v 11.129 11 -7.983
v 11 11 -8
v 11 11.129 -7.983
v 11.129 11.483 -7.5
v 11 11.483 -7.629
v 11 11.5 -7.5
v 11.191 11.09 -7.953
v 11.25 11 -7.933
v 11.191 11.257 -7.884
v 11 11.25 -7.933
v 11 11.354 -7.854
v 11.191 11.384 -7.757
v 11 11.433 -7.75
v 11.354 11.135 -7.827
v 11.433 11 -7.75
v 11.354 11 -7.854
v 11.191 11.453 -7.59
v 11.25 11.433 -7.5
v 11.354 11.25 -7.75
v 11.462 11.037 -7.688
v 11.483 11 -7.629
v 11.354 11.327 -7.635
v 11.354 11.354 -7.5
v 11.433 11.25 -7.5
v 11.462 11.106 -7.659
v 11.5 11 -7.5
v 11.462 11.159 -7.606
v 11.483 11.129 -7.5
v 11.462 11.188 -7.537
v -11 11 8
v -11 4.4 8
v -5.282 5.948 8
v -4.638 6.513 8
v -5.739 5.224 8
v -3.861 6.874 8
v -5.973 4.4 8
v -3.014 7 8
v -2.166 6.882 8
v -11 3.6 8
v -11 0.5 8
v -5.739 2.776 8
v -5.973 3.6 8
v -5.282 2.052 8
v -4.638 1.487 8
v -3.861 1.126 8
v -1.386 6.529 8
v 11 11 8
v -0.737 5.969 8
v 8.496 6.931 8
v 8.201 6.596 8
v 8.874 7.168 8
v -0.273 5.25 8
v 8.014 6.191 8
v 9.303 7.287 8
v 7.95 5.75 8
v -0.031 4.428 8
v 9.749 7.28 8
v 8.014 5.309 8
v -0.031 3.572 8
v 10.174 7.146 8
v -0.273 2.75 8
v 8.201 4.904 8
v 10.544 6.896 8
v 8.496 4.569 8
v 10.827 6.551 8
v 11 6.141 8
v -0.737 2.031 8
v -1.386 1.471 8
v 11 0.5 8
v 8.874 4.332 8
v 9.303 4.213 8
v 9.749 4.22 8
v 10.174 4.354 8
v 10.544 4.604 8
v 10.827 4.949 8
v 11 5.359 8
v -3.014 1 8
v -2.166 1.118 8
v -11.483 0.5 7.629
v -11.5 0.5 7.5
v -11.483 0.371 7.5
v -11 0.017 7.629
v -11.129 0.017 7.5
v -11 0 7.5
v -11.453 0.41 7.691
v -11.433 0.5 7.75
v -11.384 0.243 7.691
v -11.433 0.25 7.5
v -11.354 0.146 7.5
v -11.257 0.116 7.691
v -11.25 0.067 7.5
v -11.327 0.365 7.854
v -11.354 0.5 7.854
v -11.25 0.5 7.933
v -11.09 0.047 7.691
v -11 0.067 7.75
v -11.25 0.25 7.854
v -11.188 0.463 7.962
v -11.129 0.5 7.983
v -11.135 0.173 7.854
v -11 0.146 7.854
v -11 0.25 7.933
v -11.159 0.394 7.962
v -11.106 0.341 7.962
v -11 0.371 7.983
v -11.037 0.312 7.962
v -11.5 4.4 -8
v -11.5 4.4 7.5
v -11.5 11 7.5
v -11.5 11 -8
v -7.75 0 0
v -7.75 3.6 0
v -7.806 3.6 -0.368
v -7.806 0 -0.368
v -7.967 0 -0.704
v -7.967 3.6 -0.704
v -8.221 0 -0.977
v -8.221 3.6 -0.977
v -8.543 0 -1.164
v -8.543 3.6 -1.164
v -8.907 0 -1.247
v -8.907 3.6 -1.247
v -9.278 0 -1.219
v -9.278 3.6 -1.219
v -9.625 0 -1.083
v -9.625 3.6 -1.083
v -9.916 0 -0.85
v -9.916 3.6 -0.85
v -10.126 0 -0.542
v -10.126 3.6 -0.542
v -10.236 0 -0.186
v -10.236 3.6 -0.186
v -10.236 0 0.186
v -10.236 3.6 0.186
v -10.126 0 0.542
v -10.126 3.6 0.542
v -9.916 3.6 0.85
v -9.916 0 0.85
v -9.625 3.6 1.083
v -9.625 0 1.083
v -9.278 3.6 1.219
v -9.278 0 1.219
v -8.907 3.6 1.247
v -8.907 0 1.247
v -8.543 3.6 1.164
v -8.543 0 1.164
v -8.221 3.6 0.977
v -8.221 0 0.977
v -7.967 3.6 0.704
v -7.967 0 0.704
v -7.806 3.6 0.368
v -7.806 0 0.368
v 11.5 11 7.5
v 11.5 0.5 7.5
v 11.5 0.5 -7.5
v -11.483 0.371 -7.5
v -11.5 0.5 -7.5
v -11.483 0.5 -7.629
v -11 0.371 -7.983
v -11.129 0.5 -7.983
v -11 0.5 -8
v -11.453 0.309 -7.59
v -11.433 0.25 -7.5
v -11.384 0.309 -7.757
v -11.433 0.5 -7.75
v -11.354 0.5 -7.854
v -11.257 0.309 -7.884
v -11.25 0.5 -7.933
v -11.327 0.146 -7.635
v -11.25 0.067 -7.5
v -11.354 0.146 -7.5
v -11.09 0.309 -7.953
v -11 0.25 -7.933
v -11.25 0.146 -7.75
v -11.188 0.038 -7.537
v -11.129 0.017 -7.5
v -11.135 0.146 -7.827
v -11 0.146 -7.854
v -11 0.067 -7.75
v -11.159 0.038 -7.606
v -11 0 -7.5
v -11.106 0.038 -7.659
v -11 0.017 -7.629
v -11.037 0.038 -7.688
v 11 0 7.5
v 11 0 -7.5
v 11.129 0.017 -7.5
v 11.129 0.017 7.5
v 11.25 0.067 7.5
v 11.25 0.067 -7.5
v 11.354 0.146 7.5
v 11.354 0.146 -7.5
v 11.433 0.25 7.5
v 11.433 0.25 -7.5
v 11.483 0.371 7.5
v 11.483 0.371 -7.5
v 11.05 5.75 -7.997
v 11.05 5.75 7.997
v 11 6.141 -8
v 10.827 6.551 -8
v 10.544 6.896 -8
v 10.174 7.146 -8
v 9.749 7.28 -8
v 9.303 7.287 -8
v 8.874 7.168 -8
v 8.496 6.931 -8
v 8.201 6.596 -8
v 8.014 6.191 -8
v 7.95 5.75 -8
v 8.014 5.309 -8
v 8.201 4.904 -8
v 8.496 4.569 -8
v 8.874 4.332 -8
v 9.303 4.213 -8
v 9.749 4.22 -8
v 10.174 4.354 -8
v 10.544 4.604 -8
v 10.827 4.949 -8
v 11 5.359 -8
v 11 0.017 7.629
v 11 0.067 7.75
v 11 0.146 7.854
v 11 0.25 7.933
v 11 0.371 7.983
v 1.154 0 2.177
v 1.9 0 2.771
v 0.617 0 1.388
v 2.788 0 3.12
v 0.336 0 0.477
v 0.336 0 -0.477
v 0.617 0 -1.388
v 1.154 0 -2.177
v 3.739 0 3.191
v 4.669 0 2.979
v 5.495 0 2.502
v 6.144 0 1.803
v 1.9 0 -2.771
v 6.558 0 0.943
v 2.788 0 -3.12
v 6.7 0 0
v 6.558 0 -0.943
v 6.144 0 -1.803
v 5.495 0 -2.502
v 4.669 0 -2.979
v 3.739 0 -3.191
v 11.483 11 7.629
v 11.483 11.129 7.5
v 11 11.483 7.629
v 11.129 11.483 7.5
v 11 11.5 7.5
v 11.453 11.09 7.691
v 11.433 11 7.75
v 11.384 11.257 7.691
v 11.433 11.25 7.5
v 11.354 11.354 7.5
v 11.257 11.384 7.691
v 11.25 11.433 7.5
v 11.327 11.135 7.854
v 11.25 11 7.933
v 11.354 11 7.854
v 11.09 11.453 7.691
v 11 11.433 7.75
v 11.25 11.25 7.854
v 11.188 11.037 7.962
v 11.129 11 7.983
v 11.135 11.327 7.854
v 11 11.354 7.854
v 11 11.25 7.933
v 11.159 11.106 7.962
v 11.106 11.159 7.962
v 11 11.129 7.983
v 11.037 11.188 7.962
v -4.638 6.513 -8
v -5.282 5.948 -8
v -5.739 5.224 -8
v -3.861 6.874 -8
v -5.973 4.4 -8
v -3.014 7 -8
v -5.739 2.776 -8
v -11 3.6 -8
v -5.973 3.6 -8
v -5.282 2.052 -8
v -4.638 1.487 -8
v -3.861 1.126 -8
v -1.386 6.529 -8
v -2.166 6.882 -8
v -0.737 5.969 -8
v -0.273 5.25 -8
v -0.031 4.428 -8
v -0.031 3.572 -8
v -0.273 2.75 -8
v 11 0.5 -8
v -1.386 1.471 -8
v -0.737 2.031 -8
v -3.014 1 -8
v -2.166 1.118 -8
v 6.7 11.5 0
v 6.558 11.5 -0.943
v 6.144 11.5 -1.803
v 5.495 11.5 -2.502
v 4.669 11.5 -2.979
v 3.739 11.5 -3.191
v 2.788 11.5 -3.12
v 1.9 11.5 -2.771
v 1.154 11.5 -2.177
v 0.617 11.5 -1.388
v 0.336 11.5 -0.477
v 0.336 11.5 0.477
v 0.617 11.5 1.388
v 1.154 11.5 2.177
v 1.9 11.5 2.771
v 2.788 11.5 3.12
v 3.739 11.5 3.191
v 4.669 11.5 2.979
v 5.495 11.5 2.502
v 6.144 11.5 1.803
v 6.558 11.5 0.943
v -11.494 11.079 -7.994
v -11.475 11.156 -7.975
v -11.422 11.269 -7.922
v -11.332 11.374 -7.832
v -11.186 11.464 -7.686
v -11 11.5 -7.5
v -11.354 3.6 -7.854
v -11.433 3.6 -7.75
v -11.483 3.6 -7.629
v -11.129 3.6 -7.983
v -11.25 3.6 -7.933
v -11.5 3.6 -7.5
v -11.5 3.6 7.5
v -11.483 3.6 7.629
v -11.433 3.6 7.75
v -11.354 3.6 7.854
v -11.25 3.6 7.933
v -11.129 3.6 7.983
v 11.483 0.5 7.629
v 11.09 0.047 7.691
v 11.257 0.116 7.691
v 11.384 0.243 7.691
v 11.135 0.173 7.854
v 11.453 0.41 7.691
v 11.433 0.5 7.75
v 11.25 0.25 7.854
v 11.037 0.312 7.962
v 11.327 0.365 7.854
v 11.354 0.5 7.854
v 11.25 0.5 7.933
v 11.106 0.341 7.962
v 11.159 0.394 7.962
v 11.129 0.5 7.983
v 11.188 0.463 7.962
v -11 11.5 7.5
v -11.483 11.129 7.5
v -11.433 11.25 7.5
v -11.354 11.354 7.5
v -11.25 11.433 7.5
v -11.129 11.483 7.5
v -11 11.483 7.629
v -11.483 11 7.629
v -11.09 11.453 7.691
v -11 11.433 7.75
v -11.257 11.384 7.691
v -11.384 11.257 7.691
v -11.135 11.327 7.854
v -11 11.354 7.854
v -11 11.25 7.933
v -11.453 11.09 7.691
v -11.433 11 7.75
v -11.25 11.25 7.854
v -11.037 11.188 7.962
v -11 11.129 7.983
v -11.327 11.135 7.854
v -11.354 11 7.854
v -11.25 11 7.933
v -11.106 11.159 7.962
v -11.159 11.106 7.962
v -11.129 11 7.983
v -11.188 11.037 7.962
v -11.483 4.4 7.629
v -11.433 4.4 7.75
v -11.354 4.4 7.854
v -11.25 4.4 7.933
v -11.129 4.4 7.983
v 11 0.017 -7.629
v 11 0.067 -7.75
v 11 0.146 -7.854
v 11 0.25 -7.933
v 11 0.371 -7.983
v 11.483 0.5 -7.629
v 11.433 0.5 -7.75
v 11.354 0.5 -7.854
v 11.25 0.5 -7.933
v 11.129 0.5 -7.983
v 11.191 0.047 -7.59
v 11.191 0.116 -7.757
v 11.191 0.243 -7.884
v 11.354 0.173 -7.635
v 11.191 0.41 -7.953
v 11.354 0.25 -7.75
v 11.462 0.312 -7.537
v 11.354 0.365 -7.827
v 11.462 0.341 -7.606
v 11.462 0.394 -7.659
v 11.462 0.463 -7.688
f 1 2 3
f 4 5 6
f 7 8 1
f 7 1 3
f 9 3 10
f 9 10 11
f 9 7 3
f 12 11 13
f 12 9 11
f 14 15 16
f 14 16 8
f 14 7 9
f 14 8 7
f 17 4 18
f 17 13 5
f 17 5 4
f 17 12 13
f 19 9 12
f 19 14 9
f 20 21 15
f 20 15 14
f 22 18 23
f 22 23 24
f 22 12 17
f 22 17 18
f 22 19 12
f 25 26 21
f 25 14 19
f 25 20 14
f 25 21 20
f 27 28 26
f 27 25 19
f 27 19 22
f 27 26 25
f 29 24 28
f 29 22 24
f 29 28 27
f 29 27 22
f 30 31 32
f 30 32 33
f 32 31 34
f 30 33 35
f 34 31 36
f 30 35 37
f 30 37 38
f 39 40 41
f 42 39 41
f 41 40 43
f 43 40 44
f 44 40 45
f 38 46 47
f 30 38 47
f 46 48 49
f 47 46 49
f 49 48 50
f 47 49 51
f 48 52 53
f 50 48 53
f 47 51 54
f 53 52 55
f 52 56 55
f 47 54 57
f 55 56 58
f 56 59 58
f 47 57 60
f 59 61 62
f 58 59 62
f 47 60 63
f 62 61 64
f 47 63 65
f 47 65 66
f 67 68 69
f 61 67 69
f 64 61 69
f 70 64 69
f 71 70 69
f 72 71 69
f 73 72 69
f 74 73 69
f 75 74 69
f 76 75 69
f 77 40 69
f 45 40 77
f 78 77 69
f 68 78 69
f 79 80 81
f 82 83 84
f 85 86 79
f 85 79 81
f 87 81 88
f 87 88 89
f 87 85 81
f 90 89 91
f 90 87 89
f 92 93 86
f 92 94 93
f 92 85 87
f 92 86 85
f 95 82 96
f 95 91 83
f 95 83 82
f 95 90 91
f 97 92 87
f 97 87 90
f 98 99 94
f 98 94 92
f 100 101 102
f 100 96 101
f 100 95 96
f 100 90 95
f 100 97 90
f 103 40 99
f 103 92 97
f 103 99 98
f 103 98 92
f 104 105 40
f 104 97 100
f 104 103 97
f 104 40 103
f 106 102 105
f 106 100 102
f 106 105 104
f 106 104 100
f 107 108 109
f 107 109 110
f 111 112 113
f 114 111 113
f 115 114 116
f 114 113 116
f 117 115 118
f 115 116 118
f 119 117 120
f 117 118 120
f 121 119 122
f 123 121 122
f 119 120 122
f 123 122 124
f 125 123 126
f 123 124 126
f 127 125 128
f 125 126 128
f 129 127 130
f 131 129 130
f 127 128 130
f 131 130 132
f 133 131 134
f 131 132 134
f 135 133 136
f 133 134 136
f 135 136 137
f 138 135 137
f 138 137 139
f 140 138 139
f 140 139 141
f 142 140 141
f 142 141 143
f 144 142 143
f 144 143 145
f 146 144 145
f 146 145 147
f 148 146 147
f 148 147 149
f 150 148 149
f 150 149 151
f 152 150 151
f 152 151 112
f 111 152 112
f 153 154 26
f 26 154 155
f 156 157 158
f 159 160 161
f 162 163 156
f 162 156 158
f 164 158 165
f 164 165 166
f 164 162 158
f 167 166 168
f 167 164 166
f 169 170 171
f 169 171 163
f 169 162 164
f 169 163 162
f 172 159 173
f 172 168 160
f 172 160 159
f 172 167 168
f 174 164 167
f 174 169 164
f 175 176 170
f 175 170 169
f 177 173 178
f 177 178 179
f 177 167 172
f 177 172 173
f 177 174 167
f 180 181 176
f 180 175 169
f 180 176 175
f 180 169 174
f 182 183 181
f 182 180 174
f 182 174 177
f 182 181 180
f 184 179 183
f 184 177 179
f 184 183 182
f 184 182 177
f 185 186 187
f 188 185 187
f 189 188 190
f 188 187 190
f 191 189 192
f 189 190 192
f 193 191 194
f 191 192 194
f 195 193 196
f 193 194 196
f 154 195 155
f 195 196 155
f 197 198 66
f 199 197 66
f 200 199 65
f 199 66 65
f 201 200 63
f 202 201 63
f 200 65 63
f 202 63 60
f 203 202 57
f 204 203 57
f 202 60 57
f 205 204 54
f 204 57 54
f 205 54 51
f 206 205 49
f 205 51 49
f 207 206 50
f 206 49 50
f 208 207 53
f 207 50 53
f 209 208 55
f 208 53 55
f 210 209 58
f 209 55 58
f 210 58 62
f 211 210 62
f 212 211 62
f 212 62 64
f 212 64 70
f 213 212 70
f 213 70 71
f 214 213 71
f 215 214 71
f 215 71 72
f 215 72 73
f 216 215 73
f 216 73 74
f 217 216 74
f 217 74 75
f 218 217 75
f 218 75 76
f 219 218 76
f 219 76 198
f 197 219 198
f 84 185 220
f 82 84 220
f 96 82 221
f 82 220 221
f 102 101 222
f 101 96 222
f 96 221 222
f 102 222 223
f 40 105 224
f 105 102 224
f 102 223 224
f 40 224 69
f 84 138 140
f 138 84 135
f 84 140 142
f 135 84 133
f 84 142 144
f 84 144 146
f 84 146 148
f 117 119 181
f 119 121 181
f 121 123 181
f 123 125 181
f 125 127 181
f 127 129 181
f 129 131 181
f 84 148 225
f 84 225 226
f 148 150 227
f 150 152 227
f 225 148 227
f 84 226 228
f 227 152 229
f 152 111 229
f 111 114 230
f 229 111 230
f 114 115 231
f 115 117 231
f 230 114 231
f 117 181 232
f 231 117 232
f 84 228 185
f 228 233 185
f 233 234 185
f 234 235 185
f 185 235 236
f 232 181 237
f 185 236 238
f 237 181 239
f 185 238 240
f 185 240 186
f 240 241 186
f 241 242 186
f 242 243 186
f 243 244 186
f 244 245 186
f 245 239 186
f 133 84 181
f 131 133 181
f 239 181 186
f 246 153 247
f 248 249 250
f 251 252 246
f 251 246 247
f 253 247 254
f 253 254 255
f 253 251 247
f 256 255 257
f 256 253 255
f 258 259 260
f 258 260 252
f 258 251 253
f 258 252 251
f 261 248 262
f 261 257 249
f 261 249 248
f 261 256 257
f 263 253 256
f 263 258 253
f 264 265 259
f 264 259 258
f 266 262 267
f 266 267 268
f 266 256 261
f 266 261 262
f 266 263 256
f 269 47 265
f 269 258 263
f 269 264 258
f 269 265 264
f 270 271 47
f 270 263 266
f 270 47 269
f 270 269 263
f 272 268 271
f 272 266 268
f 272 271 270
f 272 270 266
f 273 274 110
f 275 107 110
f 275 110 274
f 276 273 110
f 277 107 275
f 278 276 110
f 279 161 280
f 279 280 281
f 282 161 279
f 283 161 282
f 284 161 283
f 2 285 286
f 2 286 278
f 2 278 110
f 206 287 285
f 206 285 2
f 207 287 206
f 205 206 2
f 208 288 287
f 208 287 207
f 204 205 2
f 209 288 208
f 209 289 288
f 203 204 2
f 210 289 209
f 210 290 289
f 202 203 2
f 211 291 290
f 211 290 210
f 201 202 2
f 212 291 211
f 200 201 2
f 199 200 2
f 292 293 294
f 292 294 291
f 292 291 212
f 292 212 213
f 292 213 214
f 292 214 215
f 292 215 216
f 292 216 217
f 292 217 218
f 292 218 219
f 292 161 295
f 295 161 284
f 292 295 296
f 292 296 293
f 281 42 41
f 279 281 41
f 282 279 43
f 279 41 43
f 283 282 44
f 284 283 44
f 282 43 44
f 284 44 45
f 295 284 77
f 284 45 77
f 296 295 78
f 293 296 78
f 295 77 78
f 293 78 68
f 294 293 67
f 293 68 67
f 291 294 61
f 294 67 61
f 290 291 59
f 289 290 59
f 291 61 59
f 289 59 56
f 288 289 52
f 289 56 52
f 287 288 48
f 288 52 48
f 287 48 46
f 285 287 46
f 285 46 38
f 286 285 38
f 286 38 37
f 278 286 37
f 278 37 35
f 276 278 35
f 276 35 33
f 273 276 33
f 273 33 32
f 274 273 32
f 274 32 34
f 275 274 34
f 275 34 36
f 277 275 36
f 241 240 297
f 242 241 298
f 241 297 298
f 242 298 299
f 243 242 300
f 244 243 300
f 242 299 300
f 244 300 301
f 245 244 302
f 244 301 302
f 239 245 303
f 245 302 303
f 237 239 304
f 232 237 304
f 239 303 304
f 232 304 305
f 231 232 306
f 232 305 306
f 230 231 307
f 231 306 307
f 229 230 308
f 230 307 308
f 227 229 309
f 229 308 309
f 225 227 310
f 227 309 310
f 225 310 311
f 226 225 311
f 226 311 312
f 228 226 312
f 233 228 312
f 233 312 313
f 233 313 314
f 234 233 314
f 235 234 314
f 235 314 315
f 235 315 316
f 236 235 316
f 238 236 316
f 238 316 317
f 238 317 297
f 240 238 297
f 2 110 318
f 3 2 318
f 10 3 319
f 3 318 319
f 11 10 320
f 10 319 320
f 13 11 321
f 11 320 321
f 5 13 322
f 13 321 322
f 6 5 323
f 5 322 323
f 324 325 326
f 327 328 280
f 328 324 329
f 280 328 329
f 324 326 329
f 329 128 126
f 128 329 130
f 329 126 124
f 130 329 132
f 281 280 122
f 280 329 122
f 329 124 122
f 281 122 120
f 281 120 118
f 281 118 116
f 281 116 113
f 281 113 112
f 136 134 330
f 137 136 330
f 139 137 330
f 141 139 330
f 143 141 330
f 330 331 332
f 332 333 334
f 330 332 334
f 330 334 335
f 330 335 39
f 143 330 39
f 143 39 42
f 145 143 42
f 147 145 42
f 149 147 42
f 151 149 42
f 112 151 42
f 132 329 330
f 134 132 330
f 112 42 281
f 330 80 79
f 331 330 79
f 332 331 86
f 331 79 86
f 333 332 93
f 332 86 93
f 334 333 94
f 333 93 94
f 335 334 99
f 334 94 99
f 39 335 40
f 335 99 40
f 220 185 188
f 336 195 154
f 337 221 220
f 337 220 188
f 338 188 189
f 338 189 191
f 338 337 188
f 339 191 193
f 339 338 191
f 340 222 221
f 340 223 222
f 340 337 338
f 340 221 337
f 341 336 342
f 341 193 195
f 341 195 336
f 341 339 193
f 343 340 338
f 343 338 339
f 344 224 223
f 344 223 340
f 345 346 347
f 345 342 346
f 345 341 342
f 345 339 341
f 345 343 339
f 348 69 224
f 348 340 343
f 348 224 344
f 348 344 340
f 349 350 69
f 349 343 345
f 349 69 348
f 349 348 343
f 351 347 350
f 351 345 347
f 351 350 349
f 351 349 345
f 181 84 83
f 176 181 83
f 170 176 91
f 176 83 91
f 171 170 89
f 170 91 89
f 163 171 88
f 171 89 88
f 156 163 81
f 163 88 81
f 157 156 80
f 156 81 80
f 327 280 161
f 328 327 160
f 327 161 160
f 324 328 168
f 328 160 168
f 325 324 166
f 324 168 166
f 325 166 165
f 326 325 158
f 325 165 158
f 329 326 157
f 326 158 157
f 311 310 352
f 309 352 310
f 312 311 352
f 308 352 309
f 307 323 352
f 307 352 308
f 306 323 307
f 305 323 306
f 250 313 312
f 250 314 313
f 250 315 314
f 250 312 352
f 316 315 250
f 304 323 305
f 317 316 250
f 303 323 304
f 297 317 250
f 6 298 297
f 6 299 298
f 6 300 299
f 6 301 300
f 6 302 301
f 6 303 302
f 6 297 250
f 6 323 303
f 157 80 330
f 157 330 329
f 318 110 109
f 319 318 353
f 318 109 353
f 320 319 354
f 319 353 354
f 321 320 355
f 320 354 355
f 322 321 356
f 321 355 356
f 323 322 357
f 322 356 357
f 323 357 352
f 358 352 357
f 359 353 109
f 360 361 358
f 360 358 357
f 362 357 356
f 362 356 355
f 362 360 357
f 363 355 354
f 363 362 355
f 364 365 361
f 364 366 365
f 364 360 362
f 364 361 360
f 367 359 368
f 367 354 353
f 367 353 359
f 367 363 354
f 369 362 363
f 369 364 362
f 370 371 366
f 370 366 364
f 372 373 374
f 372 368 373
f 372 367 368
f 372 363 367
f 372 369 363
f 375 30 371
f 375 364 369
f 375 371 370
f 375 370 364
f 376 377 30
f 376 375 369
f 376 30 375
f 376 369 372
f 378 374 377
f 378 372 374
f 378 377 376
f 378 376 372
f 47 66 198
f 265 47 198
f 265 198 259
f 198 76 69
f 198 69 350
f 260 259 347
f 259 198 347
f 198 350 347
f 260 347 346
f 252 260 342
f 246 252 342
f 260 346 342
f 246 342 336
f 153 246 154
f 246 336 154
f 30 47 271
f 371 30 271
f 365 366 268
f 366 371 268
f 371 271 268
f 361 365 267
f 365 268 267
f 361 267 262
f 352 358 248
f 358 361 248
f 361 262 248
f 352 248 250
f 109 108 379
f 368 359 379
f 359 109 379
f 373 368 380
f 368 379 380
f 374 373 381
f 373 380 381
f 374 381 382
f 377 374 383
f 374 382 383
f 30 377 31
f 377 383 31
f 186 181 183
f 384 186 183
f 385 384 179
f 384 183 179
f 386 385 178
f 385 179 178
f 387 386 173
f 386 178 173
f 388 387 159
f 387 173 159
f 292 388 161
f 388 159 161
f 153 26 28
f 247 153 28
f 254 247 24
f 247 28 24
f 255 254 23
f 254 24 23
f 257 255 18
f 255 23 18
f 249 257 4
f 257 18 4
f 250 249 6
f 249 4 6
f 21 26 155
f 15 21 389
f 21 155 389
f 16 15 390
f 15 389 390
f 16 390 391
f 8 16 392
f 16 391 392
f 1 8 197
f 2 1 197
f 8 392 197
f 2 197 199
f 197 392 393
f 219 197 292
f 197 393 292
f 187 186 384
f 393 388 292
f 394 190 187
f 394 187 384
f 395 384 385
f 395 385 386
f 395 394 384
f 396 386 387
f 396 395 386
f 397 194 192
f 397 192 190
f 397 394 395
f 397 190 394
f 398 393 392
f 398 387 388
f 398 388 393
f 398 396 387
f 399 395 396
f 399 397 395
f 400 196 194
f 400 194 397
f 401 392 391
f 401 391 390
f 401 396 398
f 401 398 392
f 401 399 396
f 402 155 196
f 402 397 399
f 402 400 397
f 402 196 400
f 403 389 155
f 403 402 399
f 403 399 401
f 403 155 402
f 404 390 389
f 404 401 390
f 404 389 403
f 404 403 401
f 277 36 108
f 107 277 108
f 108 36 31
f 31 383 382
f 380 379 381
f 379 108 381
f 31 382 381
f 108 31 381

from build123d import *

# Parameters (mm, degrees)
SKETCH1_W                       = 23
SKETCH1_H                       = 16
BOSS_EXTRUDE1_DEPTH             = 11.5
SKETCH2_R                       = 1.55
CUT_EXTRUDE1_DEPTH              = 23.814469093
FILLET1_R                       = 0.5
M6_CLEARANCE_HOLE1_D            = 6.4
TAP_DRILL_FOR_M3X0_5_TAP1_D     = 2.5
TAP_DRILL_FOR_M3X0_5_TAP1_DEPTH = 4.399


with BuildPart() as part:
    # Sketch1 → Boss-Extrude1 (new body)
    with BuildSketch(Plane(origin=(0, 0, 0), x_dir=(1, 0, 0), z_dir=(0, 1, 0))):
        Rectangle(SKETCH1_W, SKETCH1_H)
    extrude(amount=BOSS_EXTRUDE1_DEPTH)

    # Sketch2 → Cut-Extrude1 (cut, through all)
    with BuildSketch(Plane.XY.offset(8)):
        with Locations((9.5, 5.75)):
            Circle(SKETCH2_R)
        with BuildLine():
            Line((-5.973213749, 4.4), (-11.5, 4.4))
            Line((-11.5, 4.4), (-11.5, 3.6))
            Line((-11.5, 3.6), (-5.973213749, 3.6))
            ThreePointArc((-5.973213749, 3.6), (0, 4), (-5.973213749, 4.4))
        make_face()
    extrude(amount=-CUT_EXTRUDE1_DEPTH, mode=Mode.SUBTRACT)

    # Fillet1
    # the kernel refuses this fillet: 0.5 mm, written as the material it takes off along each edge
    with BuildSketch(Plane(origin=(-11, 0.5, 7.5), x_dir=(0, -1, 0), z_dir=(0, 0, 1))) as fillet1_piece_1_section:
        Polygon((0, 0), (FILLET1_R * 1.02, 0), (FILLET1_R * 1.02, -FILLET1_R * 1.02), (0, -FILLET1_R * 1.02), align=None)
    fillet1_piece_1 = extrude(amount=FILLET1_R * 1.02, mode=Mode.PRIVATE)
    fillet1_piece_1 = fillet1_piece_1 - Plane(origin=(-11, 0.5, 7.5), x_dir=(0.7071067811865475, 0.7071067811865475, 0), z_dir=(0, 0, 1)) * Sphere(FILLET1_R, mode=Mode.PRIVATE)
    add(fillet1_piece_1, mode=Mode.SUBTRACT)
    with BuildSketch(Plane(origin=(-11, 11, 7.5), x_dir=(-1, 0, 0), z_dir=(0, 0, 1))) as fillet1_piece_2_section:
        Polygon((0, 0), (FILLET1_R * 1.02, 0), (FILLET1_R * 1.02, -FILLET1_R * 1.02), (0, -FILLET1_R * 1.02), align=None)
    fillet1_piece_2 = extrude(amount=FILLET1_R * 1.02, mode=Mode.PRIVATE)
    fillet1_piece_2 = fillet1_piece_2 - Plane(origin=(-11, 11, 7.5), x_dir=(0.7071067811865475, -0.7071067811865475, 0), z_dir=(0, 0, 1)) * Sphere(FILLET1_R, mode=Mode.PRIVATE)
    add(fillet1_piece_2, mode=Mode.SUBTRACT)
    with BuildSketch(Plane(origin=(11, 0.5, -7.5), x_dir=(0, -1, 0), z_dir=(1, 0, 0))) as fillet1_piece_3_section:
        Polygon((0, 0), (FILLET1_R * 1.02, 0), (FILLET1_R * 1.02, FILLET1_R * 1.02), (0, FILLET1_R * 1.02), align=None)
    fillet1_piece_3 = extrude(amount=FILLET1_R * 1.02, mode=Mode.PRIVATE)
    fillet1_piece_3 = fillet1_piece_3 - Plane(origin=(11, 0.5, -7.5), x_dir=(0, 0.7071067811865475, 0.7071067811865475), z_dir=(1, 0, 0)) * Sphere(FILLET1_R, mode=Mode.PRIVATE)
    add(fillet1_piece_3, mode=Mode.SUBTRACT)
    with BuildSketch(Plane(origin=(11, 11, -7.5), x_dir=(0, 0, -1), z_dir=(1, 0, 0))) as fillet1_piece_4_section:
        Polygon((0, 0), (FILLET1_R * 1.02, 0), (FILLET1_R * 1.02, FILLET1_R * 1.02), (0, FILLET1_R * 1.02), align=None)
    fillet1_piece_4 = extrude(amount=FILLET1_R * 1.02, mode=Mode.PRIVATE)
    fillet1_piece_4 = fillet1_piece_4 - Plane(origin=(11, 11, -7.5), x_dir=(0, -0.7071067811865475, 0.7071067811865475), z_dir=(1, 0, 0)) * Sphere(FILLET1_R, mode=Mode.PRIVATE)
    add(fillet1_piece_4, mode=Mode.SUBTRACT)
    with BuildSketch(Plane(origin=(-11, 0.5, -7.5), x_dir=(-1, 0, 0), z_dir=(0, -1, 0))) as fillet1_piece_5_section:
        Polygon((0, 0), (FILLET1_R * 1.02, 0), (FILLET1_R * 1.02, FILLET1_R * 1.02), (0, FILLET1_R * 1.02), align=None)
    fillet1_piece_5 = extrude(amount=FILLET1_R * 1.02, mode=Mode.PRIVATE)
    fillet1_piece_5 = fillet1_piece_5 - Plane(origin=(-11, 0.5, -7.5), x_dir=(0.7071067811865477, 0, 0.7071067811865474), z_dir=(0, -1, 0)) * Sphere(FILLET1_R, mode=Mode.PRIVATE)
    add(fillet1_piece_5, mode=Mode.SUBTRACT)
    with BuildSketch(Plane(origin=(11, 0.5, 7.5), x_dir=(1, 0, 0), z_dir=(0, 0, 1))) as fillet1_piece_6_section:
        Polygon((0, 0), (FILLET1_R * 1.02, 0), (FILLET1_R * 1.02, -FILLET1_R * 1.02), (0, -FILLET1_R * 1.02), align=None)
    fillet1_piece_6 = extrude(amount=FILLET1_R * 1.02, mode=Mode.PRIVATE)
    fillet1_piece_6 = fillet1_piece_6 - Plane(origin=(11, 0.5, 7.5), x_dir=(-0.7071067811865475, 0.7071067811865475, 1.4130832128153965e-15), z_dir=(0, 0, 1)) * Sphere(FILLET1_R, mode=Mode.PRIVATE)
    add(fillet1_piece_6, mode=Mode.SUBTRACT)
    with BuildSketch(Plane(origin=(11, 11, 7.5), x_dir=(1, 0, 0), z_dir=(0, 0, 1))) as fillet1_piece_7_section:
        Polygon((0, 0), (FILLET1_R * 1.02, 0), (FILLET1_R * 1.02, FILLET1_R * 1.02), (0, FILLET1_R * 1.02), align=None)
    fillet1_piece_7 = extrude(amount=FILLET1_R * 1.02, mode=Mode.PRIVATE)
    fillet1_piece_7 = fillet1_piece_7 - Plane(origin=(11, 11, 7.5), x_dir=(-0.7071067811865475, -0.7071067811865475, 1.4130832128153965e-15), z_dir=(0, 0, 1)) * Sphere(FILLET1_R, mode=Mode.PRIVATE)
    add(fillet1_piece_7, mode=Mode.SUBTRACT)
    with BuildSketch(Plane(origin=(-11.5, 0.5, 8), x_dir=(1, 0, 0), z_dir=(0, 1, 0))) as fillet1_piece_8:
        with BuildLine():
            CenterArc((FILLET1_R, FILLET1_R), FILLET1_R, 180, 90)
            Line((0, FILLET1_R), (0, 0))
            Line((0, 0), (FILLET1_R, 0))
        make_face()
    extrude(amount=4.35, mode=Mode.SUBTRACT)
    with BuildSketch(Plane(origin=(-11.5, 3.15, 8), x_dir=(1, 0, 0), z_dir=(0, 1, 0))) as fillet1_piece_9:
        with BuildLine():
            CenterArc((FILLET1_R, FILLET1_R), FILLET1_R, 180, 90)
            Line((0, FILLET1_R), (0, 0))
            Line((0, 0), (FILLET1_R, 0))
        make_face()
    extrude(amount=7.85, mode=Mode.SUBTRACT)
    with BuildSketch(Plane(origin=(11.5, 0.5, -8), x_dir=(0, 0, 1), z_dir=(0, 1, 0)), Plane(origin=(11.5, 0.5, 8), x_dir=(-1, 0, 0), z_dir=(0, 1, 0))) as fillet1_piece_10:
        with BuildLine():
            CenterArc((FILLET1_R, -FILLET1_R), FILLET1_R, 90, 90)
            Line((0, -FILLET1_R), (0, 0))
            Line((0, 0), (FILLET1_R, 0))
        make_face()
    extrude(amount=10.5, mode=Mode.SUBTRACT)
    with BuildSketch(Plane(origin=(-11.5, 0.5, -8), x_dir=(0, 0, 1), z_dir=(0, 1, 0))) as fillet1_piece_11_section:
        with BuildLine():
            CenterArc((FILLET1_R, FILLET1_R), FILLET1_R, 180, 90)
            Line((0, FILLET1_R), (0, 0))
            Line((0, 0), (FILLET1_R, 0))
        make_face()
    fillet1_piece_11 = extrude(amount=4.35, mode=Mode.PRIVATE)
    fillet1_piece_11 = split(fillet1_piece_11, bisect_by=Plane(origin=(-11.388316031, 4.4, -7.888316031), z_dir=(0, -1, 0)), keep=Keep.TOP, mode=Mode.PRIVATE)
    add(fillet1_piece_11, mode=Mode.SUBTRACT)
    with BuildSketch(Plane(origin=(11.5, 0, -7.5), x_dir=(-1, 0, 0), z_dir=(0, 0, 1)), Plane(origin=(-11.5, 0, 7.5), x_dir=(1, 0, 0), z_dir=(0, 0, -1))) as fillet1_piece_12:
        with BuildLine():
            CenterArc((FILLET1_R, -FILLET1_R), FILLET1_R, 90, 90)
            Line((0, -FILLET1_R), (0, 0))
            Line((0, 0), (FILLET1_R, 0))
        make_face()
    extrude(amount=15, mode=Mode.SUBTRACT)
    with BuildSketch(Plane(origin=(-11, 0, -8), x_dir=(0, 0, 1), z_dir=(1, 0, 0)), Plane(origin=(11, 11.5, 8), x_dir=(0, -1, 0), z_dir=(-1, 0, 0))) as fillet1_piece_13:
        with BuildLine():
            CenterArc((FILLET1_R, -FILLET1_R), FILLET1_R, 90, 90)
            Line((0, -FILLET1_R), (0, 0))
            Line((0, 0), (FILLET1_R, 0))
        make_face()
    extrude(amount=22, mode=Mode.SUBTRACT)
    with BuildSketch(Plane(origin=(11, 0, 8), x_dir=(0, 1, 0), z_dir=(-1, 0, 0))) as fillet1_piece_14:
        with BuildLine():
            CenterArc((FILLET1_R, FILLET1_R), FILLET1_R, 180, 90)
            Line((0, FILLET1_R), (0, 0))
            Line((0, 0), (FILLET1_R, 0))
        make_face()
    extrude(amount=22, mode=Mode.SUBTRACT)
    with BuildSketch(Plane(origin=(-12.75, 11.5, -8), x_dir=(0, 0, 1), z_dir=(1, 0, 0))) as fillet1_piece_15:
        with BuildLine():
            CenterArc((FILLET1_R, FILLET1_R), FILLET1_R, 180, 90)
            Line((0, FILLET1_R), (0, 0))
            Line((0, 0), (FILLET1_R, 0))
        make_face()
    extrude(amount=23.75, mode=Mode.SUBTRACT)
    with BuildSketch(Plane(origin=(11.5, 11.5, -7.5), x_dir=(-1, 0, 0), z_dir=(0, 0, 1))) as fillet1_piece_16:
        with BuildLine():
            CenterArc((FILLET1_R, FILLET1_R), FILLET1_R, 180, 90)
            Line((0, FILLET1_R), (0, 0))
            Line((0, 0), (FILLET1_R, 0))
        make_face()
    extrude(amount=15, mode=Mode.SUBTRACT)
    with BuildSketch(Plane(origin=(-11.5, 11.5, 7.5), x_dir=(0, -1, 0), z_dir=(0, 0, -1))) as fillet1_piece_17:
        with BuildLine():
            CenterArc((FILLET1_R, -FILLET1_R), FILLET1_R, 90, 90)
            Line((0, -FILLET1_R), (0, 0))
            Line((0, 0), (FILLET1_R, 0))
        make_face()
    extrude(amount=16.75, mode=Mode.SUBTRACT)

    # M6 Clearance Hole1 (through all)
    with Locations(Plane(origin=(0, 0, 0), x_dir=(-1, 0, 0), z_dir=(0, -1, 0))):
        with Locations((-3.5, 0)):
            Hole(M6_CLEARANCE_HOLE1_D / 2)

    # Tap Drill for M3x0.5 Tap1
    with Locations(Plane(origin=(0, 0, 0), x_dir=(-1, 0, 0), z_dir=(0, -1, 0))):
        with Locations((9, 0)):
            Hole(TAP_DRILL_FOR_M3X0_5_TAP1_D / 2, depth=TAP_DRILL_FOR_M3X0_5_TAP1_DEPTH)


solid = part.part
